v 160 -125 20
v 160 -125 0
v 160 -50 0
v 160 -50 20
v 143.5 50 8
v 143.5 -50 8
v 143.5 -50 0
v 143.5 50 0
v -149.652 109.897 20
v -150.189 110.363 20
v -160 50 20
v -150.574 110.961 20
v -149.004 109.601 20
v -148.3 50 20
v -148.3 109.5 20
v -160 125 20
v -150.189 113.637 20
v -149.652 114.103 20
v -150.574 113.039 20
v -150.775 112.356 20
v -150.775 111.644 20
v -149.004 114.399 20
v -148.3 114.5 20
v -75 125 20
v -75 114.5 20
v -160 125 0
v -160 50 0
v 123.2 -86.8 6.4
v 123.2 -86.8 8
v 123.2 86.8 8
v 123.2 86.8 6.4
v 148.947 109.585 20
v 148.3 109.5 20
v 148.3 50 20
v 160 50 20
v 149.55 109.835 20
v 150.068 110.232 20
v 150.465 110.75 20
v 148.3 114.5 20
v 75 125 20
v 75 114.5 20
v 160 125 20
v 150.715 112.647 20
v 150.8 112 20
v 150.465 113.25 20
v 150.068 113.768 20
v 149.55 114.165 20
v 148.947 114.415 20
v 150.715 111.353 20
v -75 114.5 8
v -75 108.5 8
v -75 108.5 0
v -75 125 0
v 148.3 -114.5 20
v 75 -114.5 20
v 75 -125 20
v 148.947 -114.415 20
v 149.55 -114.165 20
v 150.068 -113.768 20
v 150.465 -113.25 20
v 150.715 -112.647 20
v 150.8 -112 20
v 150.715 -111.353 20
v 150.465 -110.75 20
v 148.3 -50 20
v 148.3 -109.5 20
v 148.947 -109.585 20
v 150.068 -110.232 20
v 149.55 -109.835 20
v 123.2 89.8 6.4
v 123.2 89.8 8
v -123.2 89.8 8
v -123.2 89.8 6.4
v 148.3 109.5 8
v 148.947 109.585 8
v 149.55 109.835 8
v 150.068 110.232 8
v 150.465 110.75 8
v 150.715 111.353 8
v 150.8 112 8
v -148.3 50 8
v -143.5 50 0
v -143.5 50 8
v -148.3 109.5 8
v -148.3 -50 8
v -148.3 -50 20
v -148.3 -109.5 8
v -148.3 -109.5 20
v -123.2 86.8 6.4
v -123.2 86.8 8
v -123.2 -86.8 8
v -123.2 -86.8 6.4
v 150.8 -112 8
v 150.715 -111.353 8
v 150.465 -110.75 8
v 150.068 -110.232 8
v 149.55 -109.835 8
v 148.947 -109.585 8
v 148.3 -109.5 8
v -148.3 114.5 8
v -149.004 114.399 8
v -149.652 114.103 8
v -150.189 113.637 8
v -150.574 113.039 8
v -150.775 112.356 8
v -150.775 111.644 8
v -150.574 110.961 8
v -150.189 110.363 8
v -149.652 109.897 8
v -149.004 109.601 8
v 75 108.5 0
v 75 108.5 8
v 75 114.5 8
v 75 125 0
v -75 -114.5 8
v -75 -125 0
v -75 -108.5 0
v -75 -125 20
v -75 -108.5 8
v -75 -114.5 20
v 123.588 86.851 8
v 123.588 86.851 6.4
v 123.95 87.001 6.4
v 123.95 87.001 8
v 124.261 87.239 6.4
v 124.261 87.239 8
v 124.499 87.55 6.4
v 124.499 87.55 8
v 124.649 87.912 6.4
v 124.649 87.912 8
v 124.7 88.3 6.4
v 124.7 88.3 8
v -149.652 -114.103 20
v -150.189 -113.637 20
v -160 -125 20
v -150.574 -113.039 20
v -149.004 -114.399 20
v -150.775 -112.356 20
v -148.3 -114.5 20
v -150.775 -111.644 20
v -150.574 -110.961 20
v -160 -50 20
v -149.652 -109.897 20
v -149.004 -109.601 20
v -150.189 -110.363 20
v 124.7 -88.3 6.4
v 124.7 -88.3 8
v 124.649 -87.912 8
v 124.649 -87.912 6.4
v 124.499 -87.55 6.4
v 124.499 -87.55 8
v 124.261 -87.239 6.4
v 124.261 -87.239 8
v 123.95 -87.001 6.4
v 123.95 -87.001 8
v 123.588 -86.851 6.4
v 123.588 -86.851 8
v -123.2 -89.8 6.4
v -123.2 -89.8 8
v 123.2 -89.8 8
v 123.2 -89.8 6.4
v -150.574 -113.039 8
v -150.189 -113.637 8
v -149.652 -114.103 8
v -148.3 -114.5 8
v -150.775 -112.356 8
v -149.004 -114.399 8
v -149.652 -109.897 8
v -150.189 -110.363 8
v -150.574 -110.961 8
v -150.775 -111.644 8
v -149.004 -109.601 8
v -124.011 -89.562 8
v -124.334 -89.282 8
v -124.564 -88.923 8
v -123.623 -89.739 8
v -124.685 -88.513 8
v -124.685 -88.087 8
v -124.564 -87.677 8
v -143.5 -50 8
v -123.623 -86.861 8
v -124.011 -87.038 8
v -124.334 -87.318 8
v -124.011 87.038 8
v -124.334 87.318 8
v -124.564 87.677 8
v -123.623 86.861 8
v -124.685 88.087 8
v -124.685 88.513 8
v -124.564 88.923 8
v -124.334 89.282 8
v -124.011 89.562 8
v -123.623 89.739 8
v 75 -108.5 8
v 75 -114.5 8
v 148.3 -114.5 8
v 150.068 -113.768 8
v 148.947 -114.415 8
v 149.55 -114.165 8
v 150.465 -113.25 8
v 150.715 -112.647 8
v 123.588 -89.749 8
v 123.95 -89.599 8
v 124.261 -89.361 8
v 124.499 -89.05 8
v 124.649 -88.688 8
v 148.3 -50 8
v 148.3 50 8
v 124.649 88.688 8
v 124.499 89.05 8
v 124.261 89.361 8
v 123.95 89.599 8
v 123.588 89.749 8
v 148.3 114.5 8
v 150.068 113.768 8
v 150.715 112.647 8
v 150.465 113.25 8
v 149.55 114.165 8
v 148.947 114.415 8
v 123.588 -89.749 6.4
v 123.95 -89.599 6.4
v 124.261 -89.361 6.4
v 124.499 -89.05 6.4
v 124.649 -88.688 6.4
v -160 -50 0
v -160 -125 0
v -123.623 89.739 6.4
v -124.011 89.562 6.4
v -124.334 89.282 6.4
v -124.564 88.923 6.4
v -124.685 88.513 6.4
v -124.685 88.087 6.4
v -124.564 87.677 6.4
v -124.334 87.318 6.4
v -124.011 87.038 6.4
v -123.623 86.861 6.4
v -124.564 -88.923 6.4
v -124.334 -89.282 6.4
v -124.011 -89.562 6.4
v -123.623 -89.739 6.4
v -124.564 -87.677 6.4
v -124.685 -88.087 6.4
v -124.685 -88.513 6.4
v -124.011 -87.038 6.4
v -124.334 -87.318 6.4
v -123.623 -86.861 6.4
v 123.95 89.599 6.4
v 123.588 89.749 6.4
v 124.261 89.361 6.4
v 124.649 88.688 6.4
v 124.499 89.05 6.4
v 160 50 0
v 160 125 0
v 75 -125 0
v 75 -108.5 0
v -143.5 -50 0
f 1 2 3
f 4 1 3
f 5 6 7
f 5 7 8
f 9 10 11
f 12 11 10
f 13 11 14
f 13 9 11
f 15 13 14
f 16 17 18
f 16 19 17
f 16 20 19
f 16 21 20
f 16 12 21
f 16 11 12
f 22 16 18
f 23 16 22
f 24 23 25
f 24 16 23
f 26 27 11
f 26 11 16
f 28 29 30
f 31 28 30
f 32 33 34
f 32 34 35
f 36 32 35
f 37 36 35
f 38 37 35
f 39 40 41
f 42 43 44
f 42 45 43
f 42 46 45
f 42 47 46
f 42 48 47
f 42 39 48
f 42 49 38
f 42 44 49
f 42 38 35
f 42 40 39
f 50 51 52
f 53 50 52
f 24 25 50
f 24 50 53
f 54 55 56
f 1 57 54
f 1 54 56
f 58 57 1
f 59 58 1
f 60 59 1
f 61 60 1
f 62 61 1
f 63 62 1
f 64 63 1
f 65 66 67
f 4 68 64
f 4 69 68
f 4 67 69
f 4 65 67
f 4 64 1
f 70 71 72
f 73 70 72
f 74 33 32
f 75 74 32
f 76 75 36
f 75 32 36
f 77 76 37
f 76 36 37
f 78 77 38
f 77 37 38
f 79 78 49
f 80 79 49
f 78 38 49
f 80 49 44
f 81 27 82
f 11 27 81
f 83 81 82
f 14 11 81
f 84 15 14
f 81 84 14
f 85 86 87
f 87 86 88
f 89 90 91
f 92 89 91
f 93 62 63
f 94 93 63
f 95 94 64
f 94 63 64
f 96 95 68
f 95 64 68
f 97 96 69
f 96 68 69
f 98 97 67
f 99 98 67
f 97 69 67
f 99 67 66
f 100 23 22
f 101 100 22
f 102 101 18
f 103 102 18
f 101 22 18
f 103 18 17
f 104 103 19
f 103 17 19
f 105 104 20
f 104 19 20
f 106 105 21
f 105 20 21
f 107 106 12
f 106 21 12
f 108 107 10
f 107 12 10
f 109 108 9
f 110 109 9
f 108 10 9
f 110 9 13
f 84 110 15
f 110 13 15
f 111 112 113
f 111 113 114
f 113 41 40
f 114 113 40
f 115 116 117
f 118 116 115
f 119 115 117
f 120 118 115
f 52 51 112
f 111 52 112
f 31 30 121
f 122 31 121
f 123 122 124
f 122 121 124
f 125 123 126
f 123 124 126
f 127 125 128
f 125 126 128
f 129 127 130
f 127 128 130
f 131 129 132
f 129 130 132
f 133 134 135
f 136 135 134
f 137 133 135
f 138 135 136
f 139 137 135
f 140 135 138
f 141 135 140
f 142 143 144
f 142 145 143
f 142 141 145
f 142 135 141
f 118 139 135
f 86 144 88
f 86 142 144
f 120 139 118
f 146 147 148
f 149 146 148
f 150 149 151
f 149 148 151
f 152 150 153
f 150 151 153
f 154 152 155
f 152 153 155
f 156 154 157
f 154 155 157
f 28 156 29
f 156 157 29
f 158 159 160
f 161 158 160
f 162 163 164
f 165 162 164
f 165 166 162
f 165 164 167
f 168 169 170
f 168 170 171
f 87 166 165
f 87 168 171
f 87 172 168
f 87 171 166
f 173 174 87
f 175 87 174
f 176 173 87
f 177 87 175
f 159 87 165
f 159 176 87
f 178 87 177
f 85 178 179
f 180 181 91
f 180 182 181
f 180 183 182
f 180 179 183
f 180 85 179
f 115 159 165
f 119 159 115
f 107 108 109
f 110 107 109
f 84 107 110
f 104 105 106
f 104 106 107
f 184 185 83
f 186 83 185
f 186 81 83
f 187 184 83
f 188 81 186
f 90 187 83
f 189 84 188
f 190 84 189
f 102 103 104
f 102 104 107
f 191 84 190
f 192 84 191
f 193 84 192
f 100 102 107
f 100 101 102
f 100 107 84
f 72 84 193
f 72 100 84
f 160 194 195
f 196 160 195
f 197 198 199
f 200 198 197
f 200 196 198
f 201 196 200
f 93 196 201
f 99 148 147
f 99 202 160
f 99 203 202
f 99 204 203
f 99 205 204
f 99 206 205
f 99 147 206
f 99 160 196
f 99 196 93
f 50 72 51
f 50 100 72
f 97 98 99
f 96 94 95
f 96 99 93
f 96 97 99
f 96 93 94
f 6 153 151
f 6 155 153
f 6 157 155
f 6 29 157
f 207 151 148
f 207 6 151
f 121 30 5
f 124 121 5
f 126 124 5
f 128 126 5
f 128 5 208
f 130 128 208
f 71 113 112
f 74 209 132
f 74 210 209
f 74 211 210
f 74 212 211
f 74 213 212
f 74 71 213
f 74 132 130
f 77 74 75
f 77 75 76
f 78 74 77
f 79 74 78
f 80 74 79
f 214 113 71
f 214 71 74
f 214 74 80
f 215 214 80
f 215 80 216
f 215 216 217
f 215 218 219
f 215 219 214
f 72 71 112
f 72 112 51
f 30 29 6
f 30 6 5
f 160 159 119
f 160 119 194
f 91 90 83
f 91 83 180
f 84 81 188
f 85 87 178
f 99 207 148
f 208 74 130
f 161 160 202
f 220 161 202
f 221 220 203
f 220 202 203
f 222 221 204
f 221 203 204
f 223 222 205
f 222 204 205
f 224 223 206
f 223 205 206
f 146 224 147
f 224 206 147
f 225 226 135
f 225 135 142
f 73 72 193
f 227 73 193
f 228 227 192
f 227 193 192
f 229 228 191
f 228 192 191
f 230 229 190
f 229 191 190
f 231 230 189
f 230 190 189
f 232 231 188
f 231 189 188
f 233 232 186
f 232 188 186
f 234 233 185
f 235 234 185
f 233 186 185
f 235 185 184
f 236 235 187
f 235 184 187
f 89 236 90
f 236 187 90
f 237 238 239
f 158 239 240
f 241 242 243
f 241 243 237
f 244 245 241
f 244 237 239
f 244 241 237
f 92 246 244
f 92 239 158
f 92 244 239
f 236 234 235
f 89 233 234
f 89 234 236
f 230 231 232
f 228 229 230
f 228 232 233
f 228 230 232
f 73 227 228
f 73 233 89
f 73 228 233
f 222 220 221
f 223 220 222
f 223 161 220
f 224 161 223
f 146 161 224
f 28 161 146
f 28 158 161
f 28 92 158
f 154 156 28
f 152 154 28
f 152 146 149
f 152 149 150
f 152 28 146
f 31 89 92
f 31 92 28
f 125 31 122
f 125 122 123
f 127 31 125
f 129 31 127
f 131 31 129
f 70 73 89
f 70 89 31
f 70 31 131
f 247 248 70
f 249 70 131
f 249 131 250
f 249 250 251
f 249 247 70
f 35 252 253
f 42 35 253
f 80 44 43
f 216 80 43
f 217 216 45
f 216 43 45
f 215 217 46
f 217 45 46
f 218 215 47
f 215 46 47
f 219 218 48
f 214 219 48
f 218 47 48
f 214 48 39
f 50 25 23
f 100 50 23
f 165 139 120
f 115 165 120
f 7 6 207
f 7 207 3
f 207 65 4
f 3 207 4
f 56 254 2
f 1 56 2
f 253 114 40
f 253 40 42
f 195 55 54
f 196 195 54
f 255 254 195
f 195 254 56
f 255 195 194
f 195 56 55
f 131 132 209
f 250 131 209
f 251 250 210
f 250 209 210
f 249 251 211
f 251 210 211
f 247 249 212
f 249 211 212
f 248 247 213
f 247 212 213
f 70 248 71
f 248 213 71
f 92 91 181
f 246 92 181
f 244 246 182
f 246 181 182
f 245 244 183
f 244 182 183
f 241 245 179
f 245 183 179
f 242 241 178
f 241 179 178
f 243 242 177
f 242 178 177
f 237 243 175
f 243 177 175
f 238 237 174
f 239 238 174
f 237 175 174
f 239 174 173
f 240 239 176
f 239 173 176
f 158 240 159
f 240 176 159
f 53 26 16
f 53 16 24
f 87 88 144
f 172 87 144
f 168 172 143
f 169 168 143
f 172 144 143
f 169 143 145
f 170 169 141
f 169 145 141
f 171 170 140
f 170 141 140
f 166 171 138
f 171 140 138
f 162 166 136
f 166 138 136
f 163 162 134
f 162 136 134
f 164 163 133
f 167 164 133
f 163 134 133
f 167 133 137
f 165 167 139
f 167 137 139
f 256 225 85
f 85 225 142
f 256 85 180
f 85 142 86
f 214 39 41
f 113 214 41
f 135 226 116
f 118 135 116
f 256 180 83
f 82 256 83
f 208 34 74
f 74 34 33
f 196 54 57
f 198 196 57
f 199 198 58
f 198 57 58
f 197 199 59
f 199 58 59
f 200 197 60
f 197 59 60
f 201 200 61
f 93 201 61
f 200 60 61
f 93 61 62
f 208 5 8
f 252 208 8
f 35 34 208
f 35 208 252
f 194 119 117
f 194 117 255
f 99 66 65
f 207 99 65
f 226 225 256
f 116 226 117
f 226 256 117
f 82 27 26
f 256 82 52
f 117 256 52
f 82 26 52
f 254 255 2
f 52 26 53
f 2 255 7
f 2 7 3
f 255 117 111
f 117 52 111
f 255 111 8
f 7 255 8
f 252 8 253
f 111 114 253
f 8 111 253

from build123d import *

# Parameters (mm, degrees)
F0_W     = 320
F0_H     = 250
F1_DEPTH = 20
F3_DEPTH = 12
F5_DEPTH = 1.6
F6_W     = 33
F6_H     = 100
F6_W_2   = 150
F6_H_2   = 33
F7_DEPTH = 20.001


with BuildPart() as f1:
    # F0 (on Top) → F1 (new body)
    with BuildSketch(Plane.XY):
        Rectangle(F0_W, F0_H)
    extrude(amount=F1_DEPTH)

    # F2 (on face) → F3 (cut)
    with BuildSketch(Plane.XY.offset(20)):
        with BuildLine():
            ThreePointArc((148.3, 109.5), (145.8, 112), (148.3, 114.5))
            Line((148.3, 114.5), (-148.3, 114.5))
            ThreePointArc((-148.3, 114.5), (-146.532233047, 113.767766953), (-145.8, 112))
            ThreePointArc((-145.8, 112), (-146.532233047, 110.232233047), (-148.3, 109.5))
            Line((-148.3, 109.5), (-148.3, -109.5))
            ThreePointArc((-148.3, -109.5), (-146.532233047, -110.232233047), (-145.8, -112))
            ThreePointArc((-145.8, -112), (-146.532233047, -113.767766953), (-148.3, -114.5))
            Line((-148.3, -114.5), (148.3, -114.5))
            ThreePointArc((148.3, -114.5), (145.8, -112), (148.3, -109.5))
            Line((148.3, -109.5), (148.3, 109.5))
        make_face()
        with BuildLine():
            ThreePointArc((150.8, 112), (150.067766953, 113.767766953), (148.3, 114.5))
            Line((148.3, 114.5), (148.3, 109.5))
            ThreePointArc((148.3, 109.5), (150.067766953, 110.232233047), (150.8, 112))
        make_face()
        with BuildLine():
            Line((148.3, 109.5), (148.3, 114.5))
            ThreePointArc((148.3, 114.5), (145.8, 112), (148.3, 109.5))
        make_face()
        with BuildLine():
            ThreePointArc((-145.8, 112), (-146.532233047, 113.767766953), (-148.3, 114.5))
            Line((-148.3, 114.5), (-148.3, 109.5))
            ThreePointArc((-148.3, 109.5), (-146.532233047, 110.232233047), (-145.8, 112))
        make_face()
        with BuildLine():
            Line((-148.3, 109.5), (-148.3, 114.5))
            ThreePointArc((-148.3, 114.5), (-150.8, 112), (-148.3, 109.5))
        make_face()
        with BuildLine():
            ThreePointArc((150.8, -112), (150.067766953, -110.232233047), (148.3, -109.5))
            Line((148.3, -109.5), (148.3, -114.5))
            ThreePointArc((148.3, -114.5), (150.067766953, -113.767766953), (150.8, -112))
        make_face()
        with BuildLine():
            Line((148.3, -114.5), (148.3, -109.5))
            ThreePointArc((148.3, -109.5), (145.8, -112), (148.3, -114.5))
        make_face()
        with BuildLine():
            ThreePointArc((-145.8, -112), (-146.532233047, -110.232233047), (-148.3, -109.5))
            Line((-148.3, -109.5), (-148.3, -114.5))
            ThreePointArc((-148.3, -114.5), (-146.532233047, -113.767766953), (-145.8, -112))
        make_face()
        with BuildLine():
            Line((-148.3, -114.5), (-148.3, -109.5))
            ThreePointArc((-148.3, -109.5), (-150.8, -112), (-148.3, -114.5))
        make_face()
    extrude(amount=-F3_DEPTH, mode=Mode.SUBTRACT)

    # F4 (on face) → F5 (cut)
    with BuildSketch(Plane.XY.offset(8)):
        with BuildLine():
            ThreePointArc((123.2, 86.8), (121.7, 88.3), (123.2, 89.8))
            Line((123.2, 89.8), (-123.2, 89.8))
            ThreePointArc((-123.2, 89.8), (-122.1393398282, 89.3606601718), (-121.7, 88.3))
            ThreePointArc((-121.7, 88.3), (-122.1393398282, 87.2393398282), (-123.2, 86.8))
            Line((-123.2, 86.8), (-123.2, -86.8))
            ThreePointArc((-123.2, -86.8), (-122.1393398282, -87.2393398282), (-121.7, -88.3))
            ThreePointArc((-121.7, -88.3), (-122.1393398282, -89.3606601718), (-123.2, -89.8))
            Line((-123.2, -89.8), (123.2, -89.8))
            ThreePointArc((123.2, -89.8), (121.7, -88.3), (123.2, -86.8))
            Line((123.2, -86.8), (123.2, 86.8))
        make_face()
        with BuildLine():
            ThreePointArc((124.7, 88.3), (124.2606601718, 89.3606601718), (123.2, 89.8))
            Line((123.2, 89.8), (123.2, 86.8))
            ThreePointArc((123.2, 86.8), (124.2606601718, 87.2393398282), (124.7, 88.3))
        make_face()
        with BuildLine():
            Line((123.2, 86.8), (123.2, 89.8))
            ThreePointArc((123.2, 89.8), (121.7, 88.3), (123.2, 86.8))
        make_face()
        with BuildLine():
            ThreePointArc((-121.7, 88.3), (-122.1393398282, 89.3606601718), (-123.2, 89.8))
            Line((-123.2, 89.8), (-123.2, 86.8))
            ThreePointArc((-123.2, 86.8), (-122.1393398282, 87.2393398282), (-121.7, 88.3))
        make_face()
        with BuildLine():
            Line((-123.2, 86.8), (-123.2, 89.8))
            ThreePointArc((-123.2, 89.8), (-124.7, 88.3), (-123.2, 86.8))
        make_face()
        with BuildLine():
            ThreePointArc((124.7, -88.3), (124.2606601718, -87.2393398282), (123.2, -86.8))
            Line((123.2, -86.8), (123.2, -89.8))
            ThreePointArc((123.2, -89.8), (124.2606601718, -89.3606601718), (124.7, -88.3))
        make_face()
        with BuildLine():
            Line((123.2, -89.8), (123.2, -86.8))
            ThreePointArc((123.2, -86.8), (121.7, -88.3), (123.2, -89.8))
        make_face()
        with BuildLine():
            ThreePointArc((-121.7, -88.3), (-122.1393398282, -87.2393398282), (-123.2, -86.8))
            Line((-123.2, -86.8), (-123.2, -89.8))
            ThreePointArc((-123.2, -89.8), (-122.1393398282, -89.3606601718), (-121.7, -88.3))
        make_face()
        with BuildLine():
            Line((-123.2, -89.8), (-123.2, -86.8))
            ThreePointArc((-123.2, -86.8), (-124.7, -88.3), (-123.2, -89.8))
        make_face()
    extrude(amount=-F5_DEPTH, mode=Mode.SUBTRACT)

    # F6 (on face) → F7 (cut, through all)
    with BuildSketch(Plane.XY.offset(20)):
        with Locations((-160, 0)):
            Rectangle(F6_W, F6_H)
        with Locations((0, 125)):
            Rectangle(F6_W_2, F6_H_2)
        with Locations((160, 0)):
            Rectangle(F6_W, F6_H)
        with Locations((0, -125)):
            Rectangle(F6_W_2, F6_H_2)
    extrude(amount=-F7_DEPTH, mode=Mode.SUBTRACT)


solid = f1.part
